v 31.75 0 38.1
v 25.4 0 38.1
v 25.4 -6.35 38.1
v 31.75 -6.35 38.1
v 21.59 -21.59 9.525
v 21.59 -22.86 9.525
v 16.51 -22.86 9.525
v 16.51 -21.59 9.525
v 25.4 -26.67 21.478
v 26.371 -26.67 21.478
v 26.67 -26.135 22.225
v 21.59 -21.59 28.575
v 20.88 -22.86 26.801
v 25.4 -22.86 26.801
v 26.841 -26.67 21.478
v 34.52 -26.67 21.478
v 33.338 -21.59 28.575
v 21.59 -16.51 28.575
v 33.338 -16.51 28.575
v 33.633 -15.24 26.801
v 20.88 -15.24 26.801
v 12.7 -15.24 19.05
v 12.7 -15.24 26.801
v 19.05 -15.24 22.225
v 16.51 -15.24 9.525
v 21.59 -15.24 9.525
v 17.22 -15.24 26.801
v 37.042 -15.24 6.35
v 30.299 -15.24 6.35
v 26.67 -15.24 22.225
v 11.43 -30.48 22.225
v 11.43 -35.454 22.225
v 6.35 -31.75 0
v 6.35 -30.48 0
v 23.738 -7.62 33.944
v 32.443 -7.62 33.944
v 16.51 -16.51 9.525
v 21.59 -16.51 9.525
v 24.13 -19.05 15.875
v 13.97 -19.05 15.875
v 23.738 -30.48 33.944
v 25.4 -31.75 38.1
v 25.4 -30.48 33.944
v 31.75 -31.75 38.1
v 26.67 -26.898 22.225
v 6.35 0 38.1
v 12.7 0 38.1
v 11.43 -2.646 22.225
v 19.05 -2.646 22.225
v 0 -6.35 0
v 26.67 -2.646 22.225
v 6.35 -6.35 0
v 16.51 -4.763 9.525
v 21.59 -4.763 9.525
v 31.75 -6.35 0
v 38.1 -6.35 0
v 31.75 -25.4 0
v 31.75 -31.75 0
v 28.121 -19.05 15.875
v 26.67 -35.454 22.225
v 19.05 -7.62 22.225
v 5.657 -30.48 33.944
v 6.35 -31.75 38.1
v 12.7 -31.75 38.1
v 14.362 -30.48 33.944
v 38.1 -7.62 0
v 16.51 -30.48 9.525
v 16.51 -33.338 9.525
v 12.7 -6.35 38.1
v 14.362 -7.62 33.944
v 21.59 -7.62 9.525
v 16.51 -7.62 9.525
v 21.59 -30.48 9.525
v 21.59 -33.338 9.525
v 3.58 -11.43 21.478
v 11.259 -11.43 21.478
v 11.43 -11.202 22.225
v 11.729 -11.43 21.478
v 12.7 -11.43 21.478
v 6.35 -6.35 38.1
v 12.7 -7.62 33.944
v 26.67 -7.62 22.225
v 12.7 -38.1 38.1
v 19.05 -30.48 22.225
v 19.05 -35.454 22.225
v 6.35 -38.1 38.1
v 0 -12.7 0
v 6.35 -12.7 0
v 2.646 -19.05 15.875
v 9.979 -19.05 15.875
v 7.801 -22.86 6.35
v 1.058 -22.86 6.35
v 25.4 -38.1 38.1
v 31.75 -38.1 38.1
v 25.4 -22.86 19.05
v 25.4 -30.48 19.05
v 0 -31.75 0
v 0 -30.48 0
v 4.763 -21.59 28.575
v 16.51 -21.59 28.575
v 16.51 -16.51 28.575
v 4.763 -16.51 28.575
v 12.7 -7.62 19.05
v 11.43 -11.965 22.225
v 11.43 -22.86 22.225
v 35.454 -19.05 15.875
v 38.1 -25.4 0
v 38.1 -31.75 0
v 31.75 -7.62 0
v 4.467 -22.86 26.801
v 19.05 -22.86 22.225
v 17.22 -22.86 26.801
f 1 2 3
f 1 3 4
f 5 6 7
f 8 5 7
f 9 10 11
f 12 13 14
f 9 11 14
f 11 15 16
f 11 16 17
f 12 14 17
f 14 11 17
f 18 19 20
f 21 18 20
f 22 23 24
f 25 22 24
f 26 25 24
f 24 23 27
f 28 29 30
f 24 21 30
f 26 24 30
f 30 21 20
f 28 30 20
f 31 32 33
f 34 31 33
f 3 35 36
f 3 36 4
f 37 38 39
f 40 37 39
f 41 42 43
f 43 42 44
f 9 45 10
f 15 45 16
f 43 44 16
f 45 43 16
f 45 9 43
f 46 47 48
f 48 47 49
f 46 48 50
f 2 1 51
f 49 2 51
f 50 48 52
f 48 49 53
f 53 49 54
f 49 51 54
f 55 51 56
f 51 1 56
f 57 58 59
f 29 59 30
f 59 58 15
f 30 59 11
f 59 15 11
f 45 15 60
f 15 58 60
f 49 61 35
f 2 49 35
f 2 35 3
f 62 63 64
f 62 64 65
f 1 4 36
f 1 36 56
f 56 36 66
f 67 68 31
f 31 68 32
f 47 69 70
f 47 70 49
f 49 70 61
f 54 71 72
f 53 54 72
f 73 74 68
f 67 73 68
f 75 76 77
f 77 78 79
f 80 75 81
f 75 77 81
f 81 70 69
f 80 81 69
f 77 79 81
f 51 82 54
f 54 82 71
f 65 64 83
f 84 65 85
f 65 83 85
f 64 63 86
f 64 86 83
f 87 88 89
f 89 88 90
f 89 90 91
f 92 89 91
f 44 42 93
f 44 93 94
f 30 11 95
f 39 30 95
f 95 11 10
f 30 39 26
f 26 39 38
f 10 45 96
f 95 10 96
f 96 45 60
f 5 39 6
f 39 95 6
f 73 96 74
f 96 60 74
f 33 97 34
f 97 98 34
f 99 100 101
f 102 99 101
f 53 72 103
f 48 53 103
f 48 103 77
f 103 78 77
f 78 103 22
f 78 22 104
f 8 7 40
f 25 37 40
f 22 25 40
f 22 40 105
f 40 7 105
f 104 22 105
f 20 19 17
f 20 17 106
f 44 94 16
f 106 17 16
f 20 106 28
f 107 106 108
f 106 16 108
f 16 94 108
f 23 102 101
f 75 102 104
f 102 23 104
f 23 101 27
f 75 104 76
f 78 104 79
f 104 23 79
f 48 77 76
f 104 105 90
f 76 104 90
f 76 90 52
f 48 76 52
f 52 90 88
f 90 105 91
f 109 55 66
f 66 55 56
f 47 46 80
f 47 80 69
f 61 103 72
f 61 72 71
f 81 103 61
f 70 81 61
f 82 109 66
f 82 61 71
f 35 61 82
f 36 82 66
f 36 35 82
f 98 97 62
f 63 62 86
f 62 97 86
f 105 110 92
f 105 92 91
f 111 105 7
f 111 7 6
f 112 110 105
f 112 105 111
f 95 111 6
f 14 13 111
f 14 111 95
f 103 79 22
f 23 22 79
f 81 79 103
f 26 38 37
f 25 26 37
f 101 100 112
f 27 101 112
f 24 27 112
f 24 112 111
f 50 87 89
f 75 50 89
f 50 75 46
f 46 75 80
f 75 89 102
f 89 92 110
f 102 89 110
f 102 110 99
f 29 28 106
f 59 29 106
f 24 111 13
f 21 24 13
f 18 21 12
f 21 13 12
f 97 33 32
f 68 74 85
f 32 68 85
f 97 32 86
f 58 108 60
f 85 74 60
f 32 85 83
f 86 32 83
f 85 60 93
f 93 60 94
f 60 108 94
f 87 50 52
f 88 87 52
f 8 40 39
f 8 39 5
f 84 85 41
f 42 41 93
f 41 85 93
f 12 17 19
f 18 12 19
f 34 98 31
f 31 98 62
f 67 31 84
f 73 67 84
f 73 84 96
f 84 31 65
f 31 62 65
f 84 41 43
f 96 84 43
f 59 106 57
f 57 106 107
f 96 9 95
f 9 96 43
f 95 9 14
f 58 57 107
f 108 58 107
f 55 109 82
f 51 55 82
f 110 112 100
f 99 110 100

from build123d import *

# Parameters (mm, degrees)
F0_W      = 38.1
F0_H      = 38.1
F1_DEPTH  = 38.1
F6_DEPTH  = 38.1
F8_DEPTH  = 38.1
F9_W      = 25.4
F9_H      = 7.62
F10_DEPTH = 38.1


with BuildPart() as f1:
    # F0 (on Front) → F1 (new body)
    with BuildSketch(Plane.XZ):
        with Locations((19.05, 19.05)):
            Rectangle(F0_W, F0_H)
    extrude(amount=F1_DEPTH)

    # F5 (on offset) → F6 (cut)
    with BuildSketch(Plane.YZ.offset(38.1)):
        Polygon((-11.43, 21.477904), (-6.35, 38.1), (-31.750008, 38.1), (-26.67, 21.477904), (-21.59, 28.575), (-16.51, 28.575), align=None)
        Polygon((-31.750008, 0), (-38.100008, 38.1), (-38.100008, 0), align=None)
        Polygon((-25.400008, 0), (-12.700008, 0), (-19.050008, 15.875), align=None)
        Polygon((-6.35, 0), (0, 0), (0, 38.1), align=None)
    extrude(amount=-F6_DEPTH, mode=Mode.SUBTRACT)

    # F7 (on offset) → F8 (cut)
    with BuildSketch(Plane.XZ.offset(38.1)):
        Polygon((11.43, 22.225), (6.35, 0), (31.75, 0), (26.67, 22.225), (21.59, 9.525), (16.51, 9.525), align=None)
        Polygon((0, 0), (6.35, 38.1), (0, 38.1), align=None)
        Polygon((25.4, 38.1), (12.7, 38.1), (19.05, 22.225), align=None)
        Polygon((38.1, 38.1), (31.75, 38.1), (38.1, 0), align=None)
    extrude(amount=-F8_DEPTH, mode=Mode.SUBTRACT)

    # F9 (on offset) → F10 (cut)
    with BuildSketch(Plane.XY.offset(38.1)):
        with Locations((25.4, -11.43)):
            Rectangle(F9_W, F9_H)
        with Locations((12.7, -26.67)):
            Rectangle(F9_W, F9_H)
    extrude(amount=-F10_DEPTH, mode=Mode.SUBTRACT)


solid = f1.part
